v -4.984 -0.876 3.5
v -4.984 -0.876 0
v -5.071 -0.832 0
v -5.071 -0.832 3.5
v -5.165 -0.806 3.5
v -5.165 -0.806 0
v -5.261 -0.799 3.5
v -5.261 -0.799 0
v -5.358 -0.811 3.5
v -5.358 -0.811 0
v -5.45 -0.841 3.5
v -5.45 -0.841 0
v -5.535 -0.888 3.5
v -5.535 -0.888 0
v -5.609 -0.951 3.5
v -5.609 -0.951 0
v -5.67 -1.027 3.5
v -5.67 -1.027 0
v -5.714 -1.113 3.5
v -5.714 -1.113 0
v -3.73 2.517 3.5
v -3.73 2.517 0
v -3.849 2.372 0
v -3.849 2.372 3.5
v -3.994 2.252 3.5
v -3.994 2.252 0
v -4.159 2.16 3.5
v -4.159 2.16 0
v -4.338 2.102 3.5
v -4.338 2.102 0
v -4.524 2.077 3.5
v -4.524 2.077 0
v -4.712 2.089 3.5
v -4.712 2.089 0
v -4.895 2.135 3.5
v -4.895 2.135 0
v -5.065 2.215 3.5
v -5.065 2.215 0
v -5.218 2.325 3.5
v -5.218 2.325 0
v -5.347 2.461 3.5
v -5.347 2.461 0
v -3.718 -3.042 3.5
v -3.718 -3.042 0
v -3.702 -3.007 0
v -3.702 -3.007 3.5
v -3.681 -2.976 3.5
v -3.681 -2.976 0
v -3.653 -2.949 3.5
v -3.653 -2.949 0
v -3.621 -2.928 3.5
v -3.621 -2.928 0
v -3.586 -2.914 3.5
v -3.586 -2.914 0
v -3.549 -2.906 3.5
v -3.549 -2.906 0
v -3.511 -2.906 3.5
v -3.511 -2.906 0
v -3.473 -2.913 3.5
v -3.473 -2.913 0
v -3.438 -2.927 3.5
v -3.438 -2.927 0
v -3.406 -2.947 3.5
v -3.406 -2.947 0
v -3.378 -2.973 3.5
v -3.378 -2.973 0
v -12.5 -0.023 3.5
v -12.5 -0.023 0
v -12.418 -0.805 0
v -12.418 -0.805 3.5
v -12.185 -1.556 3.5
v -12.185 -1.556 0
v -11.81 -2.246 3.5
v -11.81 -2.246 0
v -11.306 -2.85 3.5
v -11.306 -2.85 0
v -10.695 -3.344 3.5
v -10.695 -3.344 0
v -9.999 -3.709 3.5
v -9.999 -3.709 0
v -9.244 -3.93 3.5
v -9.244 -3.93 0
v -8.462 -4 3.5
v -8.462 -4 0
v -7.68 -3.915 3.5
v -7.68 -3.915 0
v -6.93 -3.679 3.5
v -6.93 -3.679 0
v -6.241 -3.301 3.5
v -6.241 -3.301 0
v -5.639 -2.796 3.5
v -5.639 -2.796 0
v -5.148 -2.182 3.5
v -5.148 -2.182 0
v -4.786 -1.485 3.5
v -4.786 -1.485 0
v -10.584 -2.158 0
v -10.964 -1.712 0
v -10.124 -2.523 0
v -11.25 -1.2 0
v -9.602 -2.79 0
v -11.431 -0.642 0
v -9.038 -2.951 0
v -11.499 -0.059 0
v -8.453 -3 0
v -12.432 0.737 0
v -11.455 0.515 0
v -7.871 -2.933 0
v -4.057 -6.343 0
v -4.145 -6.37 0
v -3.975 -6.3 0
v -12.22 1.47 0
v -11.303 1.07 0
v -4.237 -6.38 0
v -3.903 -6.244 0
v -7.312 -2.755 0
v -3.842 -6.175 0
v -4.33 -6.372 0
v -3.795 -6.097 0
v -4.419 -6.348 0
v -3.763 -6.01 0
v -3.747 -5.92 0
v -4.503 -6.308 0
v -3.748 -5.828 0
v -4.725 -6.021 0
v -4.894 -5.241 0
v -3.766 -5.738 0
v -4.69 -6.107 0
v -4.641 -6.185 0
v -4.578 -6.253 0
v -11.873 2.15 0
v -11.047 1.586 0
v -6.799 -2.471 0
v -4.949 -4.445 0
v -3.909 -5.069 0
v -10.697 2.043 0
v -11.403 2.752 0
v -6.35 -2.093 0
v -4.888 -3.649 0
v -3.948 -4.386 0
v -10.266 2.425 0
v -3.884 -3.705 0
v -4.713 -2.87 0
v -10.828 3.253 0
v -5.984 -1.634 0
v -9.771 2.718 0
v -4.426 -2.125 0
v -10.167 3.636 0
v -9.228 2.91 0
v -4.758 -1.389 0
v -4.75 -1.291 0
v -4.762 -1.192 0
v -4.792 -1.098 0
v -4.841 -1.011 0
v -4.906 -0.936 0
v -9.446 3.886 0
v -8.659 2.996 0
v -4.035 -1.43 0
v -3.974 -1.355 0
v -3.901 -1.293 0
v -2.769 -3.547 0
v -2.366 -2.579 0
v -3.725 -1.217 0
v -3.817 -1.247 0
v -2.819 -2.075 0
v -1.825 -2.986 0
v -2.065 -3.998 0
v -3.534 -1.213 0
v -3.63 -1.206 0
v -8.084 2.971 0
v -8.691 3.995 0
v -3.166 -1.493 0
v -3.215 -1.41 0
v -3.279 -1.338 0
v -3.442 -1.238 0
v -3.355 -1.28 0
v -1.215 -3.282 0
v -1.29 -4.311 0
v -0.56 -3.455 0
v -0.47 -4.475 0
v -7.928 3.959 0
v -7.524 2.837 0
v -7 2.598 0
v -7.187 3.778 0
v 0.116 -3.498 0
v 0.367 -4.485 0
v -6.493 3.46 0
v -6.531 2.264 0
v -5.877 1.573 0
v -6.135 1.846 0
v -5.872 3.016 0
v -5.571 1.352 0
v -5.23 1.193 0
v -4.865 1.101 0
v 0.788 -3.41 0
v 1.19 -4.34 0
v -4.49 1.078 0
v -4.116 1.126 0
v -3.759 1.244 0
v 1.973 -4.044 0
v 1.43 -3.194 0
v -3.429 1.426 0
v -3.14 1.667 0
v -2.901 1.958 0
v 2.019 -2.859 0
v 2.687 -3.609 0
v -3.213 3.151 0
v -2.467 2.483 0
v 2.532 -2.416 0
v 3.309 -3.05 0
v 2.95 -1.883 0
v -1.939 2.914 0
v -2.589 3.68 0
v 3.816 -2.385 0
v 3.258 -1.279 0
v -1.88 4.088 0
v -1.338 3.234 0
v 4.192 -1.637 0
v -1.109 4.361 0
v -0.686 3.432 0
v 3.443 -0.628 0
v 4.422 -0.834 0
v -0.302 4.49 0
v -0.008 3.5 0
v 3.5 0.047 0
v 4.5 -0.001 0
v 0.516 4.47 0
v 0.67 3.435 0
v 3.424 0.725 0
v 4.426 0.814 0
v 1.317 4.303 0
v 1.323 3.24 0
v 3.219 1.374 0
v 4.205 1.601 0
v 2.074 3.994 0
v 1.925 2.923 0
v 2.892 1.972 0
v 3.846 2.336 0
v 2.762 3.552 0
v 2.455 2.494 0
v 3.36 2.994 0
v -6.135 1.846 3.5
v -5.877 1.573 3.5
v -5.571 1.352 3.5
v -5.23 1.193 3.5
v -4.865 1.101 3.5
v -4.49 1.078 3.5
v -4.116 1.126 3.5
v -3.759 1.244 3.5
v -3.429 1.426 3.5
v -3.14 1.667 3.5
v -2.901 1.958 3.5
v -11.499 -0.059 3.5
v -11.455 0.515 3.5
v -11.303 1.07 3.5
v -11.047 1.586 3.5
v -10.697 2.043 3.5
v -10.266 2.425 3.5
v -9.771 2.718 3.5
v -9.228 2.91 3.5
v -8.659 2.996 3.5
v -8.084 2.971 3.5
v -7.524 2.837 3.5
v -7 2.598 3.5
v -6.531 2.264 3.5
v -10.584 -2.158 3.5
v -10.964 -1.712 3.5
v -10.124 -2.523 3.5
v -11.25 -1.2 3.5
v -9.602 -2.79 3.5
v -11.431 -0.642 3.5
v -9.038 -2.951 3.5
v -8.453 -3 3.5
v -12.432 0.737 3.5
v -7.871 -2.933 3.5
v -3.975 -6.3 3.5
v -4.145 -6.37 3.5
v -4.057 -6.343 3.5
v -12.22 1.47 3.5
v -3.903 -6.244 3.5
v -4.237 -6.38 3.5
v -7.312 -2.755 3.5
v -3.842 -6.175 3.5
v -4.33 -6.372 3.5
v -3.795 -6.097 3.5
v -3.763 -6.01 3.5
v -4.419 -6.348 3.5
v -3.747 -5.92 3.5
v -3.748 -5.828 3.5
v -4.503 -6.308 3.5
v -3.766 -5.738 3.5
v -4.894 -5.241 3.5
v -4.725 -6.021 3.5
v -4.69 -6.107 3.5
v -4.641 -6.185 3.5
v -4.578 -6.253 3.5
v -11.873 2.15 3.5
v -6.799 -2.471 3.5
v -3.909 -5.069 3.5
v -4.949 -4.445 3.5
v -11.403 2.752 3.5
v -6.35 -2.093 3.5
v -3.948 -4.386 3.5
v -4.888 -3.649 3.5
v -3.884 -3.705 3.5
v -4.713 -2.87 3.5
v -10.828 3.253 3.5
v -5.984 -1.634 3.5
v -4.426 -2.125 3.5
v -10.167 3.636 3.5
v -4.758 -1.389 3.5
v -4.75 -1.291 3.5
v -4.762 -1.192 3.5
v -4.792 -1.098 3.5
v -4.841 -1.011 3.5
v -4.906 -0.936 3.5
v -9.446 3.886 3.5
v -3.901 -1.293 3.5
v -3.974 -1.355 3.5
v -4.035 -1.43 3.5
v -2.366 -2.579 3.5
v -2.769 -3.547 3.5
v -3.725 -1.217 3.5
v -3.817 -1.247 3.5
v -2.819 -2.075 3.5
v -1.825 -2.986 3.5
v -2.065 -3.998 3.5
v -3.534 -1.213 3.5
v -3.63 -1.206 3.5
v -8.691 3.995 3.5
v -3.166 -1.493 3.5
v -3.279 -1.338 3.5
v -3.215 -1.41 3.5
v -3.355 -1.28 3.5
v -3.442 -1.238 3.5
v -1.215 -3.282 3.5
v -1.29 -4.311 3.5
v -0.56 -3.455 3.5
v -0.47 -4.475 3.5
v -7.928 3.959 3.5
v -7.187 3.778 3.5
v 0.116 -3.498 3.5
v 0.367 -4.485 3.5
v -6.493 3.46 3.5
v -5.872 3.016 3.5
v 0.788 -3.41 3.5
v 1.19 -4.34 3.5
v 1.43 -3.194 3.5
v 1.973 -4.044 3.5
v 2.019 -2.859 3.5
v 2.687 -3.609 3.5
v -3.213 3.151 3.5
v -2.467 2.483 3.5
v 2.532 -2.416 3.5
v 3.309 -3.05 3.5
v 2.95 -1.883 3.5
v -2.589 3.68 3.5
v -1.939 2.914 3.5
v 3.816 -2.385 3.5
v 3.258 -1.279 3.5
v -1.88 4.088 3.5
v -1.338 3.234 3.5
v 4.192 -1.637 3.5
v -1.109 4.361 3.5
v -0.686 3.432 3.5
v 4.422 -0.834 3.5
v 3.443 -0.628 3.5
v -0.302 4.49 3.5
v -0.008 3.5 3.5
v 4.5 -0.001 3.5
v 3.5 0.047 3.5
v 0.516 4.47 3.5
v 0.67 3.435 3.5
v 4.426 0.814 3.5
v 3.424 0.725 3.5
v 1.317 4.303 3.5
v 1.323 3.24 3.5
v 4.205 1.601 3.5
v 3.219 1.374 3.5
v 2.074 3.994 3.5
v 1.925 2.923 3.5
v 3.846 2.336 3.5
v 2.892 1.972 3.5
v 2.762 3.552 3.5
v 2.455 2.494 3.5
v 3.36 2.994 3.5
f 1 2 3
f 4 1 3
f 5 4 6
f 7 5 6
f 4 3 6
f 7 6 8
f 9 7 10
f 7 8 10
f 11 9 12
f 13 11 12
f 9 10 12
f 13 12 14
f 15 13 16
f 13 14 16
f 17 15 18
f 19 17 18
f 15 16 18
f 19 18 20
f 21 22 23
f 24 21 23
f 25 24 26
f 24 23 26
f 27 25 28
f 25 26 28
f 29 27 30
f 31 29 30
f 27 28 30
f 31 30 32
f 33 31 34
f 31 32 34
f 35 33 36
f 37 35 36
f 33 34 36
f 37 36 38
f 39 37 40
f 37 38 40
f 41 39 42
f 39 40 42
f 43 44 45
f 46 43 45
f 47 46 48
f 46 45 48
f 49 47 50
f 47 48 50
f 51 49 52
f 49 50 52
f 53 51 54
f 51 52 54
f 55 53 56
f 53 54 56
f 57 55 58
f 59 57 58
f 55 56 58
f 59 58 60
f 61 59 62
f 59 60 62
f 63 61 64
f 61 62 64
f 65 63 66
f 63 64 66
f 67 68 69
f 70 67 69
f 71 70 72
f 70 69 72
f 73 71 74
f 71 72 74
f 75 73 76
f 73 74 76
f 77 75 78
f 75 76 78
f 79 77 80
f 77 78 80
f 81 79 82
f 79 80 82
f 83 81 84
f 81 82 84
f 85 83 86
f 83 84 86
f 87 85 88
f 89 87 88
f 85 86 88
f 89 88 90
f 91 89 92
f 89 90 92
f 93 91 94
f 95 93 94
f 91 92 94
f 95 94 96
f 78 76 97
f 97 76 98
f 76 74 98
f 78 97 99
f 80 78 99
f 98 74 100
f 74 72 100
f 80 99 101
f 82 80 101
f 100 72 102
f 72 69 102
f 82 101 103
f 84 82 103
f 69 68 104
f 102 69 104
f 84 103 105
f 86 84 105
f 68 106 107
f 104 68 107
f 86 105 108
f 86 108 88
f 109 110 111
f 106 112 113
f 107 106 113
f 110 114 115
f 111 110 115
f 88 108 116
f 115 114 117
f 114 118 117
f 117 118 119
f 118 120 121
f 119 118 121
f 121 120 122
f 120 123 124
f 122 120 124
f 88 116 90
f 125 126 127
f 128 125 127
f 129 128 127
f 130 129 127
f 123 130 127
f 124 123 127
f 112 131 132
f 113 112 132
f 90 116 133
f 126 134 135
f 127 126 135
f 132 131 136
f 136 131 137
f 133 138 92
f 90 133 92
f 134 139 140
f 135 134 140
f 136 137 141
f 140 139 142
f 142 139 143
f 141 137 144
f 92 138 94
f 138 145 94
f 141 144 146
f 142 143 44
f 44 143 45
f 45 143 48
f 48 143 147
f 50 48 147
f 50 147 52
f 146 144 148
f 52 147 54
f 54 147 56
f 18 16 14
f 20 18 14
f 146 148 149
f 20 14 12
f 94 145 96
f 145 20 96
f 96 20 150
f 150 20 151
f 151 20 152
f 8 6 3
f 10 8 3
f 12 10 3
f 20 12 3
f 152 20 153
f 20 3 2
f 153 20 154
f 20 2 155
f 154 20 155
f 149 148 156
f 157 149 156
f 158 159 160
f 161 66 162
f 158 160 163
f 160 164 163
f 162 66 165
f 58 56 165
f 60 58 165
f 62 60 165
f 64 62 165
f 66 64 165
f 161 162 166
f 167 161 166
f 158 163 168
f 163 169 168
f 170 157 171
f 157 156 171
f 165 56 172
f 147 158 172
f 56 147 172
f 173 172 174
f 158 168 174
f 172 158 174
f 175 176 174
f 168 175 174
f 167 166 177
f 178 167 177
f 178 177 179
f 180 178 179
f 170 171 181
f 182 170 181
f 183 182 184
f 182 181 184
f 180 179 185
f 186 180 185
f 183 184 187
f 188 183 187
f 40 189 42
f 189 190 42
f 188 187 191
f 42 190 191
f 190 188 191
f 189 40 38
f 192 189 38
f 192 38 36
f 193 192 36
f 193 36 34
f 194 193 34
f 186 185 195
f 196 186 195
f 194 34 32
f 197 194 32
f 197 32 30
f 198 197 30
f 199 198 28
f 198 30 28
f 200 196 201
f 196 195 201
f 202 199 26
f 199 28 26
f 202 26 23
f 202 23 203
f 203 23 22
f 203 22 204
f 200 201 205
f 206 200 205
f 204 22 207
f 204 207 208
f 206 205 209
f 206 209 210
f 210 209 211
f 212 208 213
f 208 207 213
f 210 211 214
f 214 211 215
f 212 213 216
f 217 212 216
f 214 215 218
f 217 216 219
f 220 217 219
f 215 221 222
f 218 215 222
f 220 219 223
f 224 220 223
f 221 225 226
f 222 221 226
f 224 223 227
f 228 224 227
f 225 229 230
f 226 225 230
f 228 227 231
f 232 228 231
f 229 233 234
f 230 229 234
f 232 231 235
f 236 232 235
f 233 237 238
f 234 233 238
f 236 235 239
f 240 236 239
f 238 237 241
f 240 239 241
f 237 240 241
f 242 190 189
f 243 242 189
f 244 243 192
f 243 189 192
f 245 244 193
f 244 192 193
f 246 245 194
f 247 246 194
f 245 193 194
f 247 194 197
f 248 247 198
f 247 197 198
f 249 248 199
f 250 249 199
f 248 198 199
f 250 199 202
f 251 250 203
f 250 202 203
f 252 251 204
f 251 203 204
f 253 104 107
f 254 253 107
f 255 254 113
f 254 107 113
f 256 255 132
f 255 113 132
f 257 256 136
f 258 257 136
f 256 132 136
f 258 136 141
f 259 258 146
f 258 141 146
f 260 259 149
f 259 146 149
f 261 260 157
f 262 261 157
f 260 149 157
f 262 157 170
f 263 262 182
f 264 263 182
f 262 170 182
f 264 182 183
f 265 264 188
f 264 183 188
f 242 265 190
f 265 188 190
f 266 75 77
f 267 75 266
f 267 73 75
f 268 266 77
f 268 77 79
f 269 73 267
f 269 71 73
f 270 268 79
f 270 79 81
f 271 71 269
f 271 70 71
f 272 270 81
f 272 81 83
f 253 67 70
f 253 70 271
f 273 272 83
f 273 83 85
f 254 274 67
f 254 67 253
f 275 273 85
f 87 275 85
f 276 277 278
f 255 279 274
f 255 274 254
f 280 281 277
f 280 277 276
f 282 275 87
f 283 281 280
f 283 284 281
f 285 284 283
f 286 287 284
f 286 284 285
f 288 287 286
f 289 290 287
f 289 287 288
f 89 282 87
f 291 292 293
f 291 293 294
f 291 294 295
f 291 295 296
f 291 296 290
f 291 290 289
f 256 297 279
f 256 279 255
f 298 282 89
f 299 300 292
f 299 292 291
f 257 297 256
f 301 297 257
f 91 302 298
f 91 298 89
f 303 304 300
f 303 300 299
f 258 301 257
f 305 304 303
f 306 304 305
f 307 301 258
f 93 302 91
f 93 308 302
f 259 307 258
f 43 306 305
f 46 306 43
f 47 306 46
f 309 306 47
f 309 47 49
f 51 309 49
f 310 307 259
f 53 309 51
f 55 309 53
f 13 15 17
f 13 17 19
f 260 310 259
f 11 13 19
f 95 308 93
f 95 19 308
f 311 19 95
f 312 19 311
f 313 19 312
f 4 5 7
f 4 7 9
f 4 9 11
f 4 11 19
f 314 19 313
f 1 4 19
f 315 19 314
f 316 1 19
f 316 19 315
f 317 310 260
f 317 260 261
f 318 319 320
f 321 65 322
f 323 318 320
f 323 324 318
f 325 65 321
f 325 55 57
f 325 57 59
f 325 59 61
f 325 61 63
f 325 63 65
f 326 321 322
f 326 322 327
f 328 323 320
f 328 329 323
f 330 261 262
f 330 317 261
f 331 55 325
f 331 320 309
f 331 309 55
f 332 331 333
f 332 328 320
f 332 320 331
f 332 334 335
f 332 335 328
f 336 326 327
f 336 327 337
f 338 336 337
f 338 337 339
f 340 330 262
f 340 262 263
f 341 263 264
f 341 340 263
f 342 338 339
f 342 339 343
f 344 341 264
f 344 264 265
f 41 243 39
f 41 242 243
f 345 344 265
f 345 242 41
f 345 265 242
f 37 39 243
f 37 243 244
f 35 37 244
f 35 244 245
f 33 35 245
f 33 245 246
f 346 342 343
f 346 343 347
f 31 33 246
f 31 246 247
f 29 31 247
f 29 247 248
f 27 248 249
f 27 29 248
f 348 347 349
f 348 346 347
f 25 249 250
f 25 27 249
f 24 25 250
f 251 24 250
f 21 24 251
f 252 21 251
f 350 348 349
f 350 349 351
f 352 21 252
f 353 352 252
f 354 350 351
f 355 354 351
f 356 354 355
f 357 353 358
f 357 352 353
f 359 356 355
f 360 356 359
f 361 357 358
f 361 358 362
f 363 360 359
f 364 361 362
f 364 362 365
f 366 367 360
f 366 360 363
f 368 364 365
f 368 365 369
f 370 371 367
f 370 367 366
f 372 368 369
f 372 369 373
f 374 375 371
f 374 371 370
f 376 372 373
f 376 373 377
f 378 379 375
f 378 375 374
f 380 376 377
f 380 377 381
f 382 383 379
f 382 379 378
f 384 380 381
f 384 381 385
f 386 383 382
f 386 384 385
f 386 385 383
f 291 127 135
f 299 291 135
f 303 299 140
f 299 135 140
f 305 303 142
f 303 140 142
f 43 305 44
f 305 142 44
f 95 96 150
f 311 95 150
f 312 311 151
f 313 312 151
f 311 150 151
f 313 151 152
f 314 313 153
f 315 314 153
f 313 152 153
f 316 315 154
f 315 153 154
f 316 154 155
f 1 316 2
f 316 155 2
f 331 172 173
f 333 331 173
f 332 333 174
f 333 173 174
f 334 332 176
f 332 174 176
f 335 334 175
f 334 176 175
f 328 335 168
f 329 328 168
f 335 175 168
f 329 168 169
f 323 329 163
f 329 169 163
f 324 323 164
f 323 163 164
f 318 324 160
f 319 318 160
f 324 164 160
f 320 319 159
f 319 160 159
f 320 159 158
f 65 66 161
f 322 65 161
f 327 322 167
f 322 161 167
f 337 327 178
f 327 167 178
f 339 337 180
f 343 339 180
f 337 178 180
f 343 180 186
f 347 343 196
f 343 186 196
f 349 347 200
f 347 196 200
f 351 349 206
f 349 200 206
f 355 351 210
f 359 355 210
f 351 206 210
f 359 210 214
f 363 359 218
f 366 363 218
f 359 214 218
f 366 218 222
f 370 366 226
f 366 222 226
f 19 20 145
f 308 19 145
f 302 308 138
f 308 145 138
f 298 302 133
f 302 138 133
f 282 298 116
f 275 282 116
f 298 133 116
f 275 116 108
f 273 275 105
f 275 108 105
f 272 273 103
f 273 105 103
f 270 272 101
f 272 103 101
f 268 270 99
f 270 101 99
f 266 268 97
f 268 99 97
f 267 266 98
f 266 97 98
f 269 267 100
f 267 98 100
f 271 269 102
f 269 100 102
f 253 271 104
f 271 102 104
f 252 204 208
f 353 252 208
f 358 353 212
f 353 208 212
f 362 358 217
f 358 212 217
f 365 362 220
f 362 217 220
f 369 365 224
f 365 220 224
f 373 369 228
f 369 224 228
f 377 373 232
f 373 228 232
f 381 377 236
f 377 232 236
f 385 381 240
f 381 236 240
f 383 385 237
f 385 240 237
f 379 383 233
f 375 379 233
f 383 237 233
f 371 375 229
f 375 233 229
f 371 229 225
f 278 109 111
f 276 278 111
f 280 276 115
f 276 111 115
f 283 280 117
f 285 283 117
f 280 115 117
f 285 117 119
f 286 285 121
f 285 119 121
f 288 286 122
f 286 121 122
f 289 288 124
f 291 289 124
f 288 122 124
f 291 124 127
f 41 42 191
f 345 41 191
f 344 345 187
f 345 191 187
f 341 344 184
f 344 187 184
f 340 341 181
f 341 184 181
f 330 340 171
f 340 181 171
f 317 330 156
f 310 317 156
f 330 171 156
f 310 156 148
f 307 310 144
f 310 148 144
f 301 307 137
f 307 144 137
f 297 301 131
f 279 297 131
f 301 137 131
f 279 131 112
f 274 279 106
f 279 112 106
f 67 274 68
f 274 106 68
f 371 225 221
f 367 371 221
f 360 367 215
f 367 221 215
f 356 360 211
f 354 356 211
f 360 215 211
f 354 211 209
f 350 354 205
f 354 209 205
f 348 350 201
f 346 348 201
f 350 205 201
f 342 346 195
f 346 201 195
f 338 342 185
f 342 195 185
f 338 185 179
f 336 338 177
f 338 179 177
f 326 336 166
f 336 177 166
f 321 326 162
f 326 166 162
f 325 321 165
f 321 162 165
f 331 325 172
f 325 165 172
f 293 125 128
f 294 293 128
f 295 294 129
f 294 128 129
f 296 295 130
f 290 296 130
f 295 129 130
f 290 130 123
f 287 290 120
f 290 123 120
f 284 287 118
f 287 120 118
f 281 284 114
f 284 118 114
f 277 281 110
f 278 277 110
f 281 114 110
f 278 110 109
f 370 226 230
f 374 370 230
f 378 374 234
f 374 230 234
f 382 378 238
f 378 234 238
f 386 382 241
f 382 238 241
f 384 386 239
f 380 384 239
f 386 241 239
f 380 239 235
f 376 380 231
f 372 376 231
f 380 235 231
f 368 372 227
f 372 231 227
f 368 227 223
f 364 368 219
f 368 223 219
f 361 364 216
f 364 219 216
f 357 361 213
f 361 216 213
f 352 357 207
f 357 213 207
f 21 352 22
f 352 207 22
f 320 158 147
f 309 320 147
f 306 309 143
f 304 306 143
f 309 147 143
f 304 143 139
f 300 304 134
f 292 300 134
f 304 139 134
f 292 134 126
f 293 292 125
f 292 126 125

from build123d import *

# Parameters (mm, degrees)
F1_DEPTH = 3.5


with BuildPart() as f1:
    # F0 (on Top) → F1 (new body)
    with BuildSketch(Plane.XY):
        with BuildLine():
            ThreePointArc((-3.729947, 2.517439), (-4.52425, 2.077468), (-5.347059, 2.461496))
            ThreePointArc((-5.347059, 2.461496), (-9.812645, 3.778487), (-12.499931, -0.023411))
            ThreePointArc((-12.499931, -0.023411), (-9.244431, -3.930117), (-4.785714, -1.484615))
            ThreePointArc((-4.785714, -1.484615), (-4.774576, -1.144209), (-4.984035, -0.875644))
            ThreePointArc((-4.984035, -0.875644), (-5.404829, -0.823614), (-5.714286, -1.113461))
            ThreePointArc((-5.714286, -1.113461), (-9.03795, -2.951374), (-11.49942, -0.058999))
            ThreePointArc((-11.49942, -0.058999), (-9.504036, 2.826997), (-6.135294, 1.846122))
            ThreePointArc((-6.135294, 1.846122), (-4.489676, 1.078066), (-2.90107, 1.958008))
            ThreePointArc((-2.90107, 1.958008), (1.001067, 3.353784), (3.499678, 0.047456))
            ThreePointArc((3.499678, 0.047456), (0.787879, -3.410168), (-3.165812, -1.492527))
            ThreePointArc((-3.165812, -1.492527), (-3.582024, -1.207046), (-4.034966, -1.429704))
            ThreePointArc((-4.034966, -1.429704), (-4.888074, -3.648968), (-4.724786, -6.020942))
            ThreePointArc((-4.724786, -6.020942), (-4.462085, -6.330099), (-4.056583, -6.342665))
            ThreePointArc((-4.056583, -6.342665), (-3.794678, -6.096503), (-3.765574, -5.738253))
            ThreePointArc((-3.765574, -5.738253), (-3.948415, -4.386443), (-3.717805, -3.041958))
            ThreePointArc((-3.717805, -3.041958), (-3.567792, -2.909236), (-3.377955, -2.973117))
            ThreePointArc((-3.377955, -2.973117), (1.588529, -4.210294), (4.5, -0.000792))
            ThreePointArc((4.5, -0.000792), (1.316669, 4.303067), (-3.729947, 2.517439))
        make_face()
    extrude(amount=F1_DEPTH)


solid = f1.part
